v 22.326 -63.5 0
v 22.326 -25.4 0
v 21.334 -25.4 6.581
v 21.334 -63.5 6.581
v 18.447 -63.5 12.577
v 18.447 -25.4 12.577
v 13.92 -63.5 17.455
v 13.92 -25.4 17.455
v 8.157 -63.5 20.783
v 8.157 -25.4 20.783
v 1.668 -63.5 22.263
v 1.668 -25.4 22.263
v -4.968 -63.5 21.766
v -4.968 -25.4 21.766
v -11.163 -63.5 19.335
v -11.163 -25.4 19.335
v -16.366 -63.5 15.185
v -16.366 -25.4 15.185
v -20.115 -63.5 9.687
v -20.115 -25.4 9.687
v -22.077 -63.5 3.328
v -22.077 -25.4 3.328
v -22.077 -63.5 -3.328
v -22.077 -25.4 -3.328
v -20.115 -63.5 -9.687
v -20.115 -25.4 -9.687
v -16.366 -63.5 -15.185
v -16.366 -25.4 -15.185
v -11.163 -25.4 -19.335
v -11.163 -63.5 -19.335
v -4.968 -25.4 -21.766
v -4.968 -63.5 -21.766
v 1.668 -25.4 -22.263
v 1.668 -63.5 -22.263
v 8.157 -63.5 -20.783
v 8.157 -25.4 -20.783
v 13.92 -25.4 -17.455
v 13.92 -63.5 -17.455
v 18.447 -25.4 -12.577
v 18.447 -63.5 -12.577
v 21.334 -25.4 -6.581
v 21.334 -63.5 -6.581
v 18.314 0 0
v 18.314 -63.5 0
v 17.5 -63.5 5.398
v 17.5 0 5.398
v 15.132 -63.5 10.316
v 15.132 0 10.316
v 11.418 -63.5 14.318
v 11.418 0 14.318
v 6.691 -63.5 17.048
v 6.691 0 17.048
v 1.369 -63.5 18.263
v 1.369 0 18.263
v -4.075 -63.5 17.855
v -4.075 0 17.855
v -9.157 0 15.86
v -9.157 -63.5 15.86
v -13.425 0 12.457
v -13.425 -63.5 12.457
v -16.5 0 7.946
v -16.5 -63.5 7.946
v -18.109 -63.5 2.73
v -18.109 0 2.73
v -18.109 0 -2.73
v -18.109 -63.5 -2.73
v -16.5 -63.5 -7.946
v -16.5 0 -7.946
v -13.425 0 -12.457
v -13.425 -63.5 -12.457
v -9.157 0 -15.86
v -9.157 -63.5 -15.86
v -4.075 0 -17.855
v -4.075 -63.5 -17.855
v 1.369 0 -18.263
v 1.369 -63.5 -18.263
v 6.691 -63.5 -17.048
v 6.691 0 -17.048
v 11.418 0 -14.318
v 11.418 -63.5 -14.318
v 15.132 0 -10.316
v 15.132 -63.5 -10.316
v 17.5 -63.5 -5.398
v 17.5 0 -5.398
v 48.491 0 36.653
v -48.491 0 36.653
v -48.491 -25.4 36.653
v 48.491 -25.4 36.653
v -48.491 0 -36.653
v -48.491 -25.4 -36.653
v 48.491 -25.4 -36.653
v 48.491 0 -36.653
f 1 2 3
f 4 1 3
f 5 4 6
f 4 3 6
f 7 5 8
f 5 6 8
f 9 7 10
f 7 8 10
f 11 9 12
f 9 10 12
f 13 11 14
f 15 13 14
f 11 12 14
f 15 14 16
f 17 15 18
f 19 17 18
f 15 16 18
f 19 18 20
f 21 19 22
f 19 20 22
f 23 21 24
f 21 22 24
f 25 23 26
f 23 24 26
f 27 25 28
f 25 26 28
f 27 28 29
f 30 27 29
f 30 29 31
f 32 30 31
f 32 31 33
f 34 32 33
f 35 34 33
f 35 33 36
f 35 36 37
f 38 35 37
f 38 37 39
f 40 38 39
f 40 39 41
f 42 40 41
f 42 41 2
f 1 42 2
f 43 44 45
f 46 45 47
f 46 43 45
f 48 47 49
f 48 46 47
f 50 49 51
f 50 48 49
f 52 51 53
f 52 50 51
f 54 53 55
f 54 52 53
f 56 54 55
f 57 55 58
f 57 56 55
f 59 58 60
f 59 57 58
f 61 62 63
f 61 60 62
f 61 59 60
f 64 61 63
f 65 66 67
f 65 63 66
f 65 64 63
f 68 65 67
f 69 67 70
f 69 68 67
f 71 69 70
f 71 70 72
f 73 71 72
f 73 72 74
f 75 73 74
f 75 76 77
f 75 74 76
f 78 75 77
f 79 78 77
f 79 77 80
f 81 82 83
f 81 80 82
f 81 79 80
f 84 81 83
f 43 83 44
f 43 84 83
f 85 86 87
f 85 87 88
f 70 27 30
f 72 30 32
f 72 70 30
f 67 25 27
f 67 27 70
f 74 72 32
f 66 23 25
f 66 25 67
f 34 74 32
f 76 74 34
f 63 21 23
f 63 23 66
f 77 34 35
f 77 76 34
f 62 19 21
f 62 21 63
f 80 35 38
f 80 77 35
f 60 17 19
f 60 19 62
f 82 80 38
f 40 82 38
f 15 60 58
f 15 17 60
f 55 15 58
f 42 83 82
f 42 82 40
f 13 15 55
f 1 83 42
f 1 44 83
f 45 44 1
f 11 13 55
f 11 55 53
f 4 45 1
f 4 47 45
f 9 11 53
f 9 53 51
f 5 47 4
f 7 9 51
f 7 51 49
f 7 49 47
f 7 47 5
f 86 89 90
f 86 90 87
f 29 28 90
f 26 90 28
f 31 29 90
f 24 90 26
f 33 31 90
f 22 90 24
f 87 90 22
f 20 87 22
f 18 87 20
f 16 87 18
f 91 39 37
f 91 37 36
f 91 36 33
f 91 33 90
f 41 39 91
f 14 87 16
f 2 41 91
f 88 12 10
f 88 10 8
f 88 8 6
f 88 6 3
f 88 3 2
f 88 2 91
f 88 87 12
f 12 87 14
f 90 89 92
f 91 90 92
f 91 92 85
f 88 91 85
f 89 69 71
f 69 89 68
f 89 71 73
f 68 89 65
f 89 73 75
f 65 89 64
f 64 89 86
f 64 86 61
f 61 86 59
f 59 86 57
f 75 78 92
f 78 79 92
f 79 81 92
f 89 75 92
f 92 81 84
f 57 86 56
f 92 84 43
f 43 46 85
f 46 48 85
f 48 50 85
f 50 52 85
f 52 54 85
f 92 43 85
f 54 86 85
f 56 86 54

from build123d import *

# Parameters (mm, degrees)
F0_W     = 96.981816
F0_H     = 73.306844
F3_DEPTH = 25.4
F1_R     = 22.325888
F4_DEPTH = 63.5
F2_R     = 18.313732
F5_DEPTH = 63.501


with BuildPart() as f3:
    # F0 (on Front) → F3 (new body)
    with BuildSketch(Plane.XZ):
        Rectangle(F0_W, F0_H)
    extrude(amount=F3_DEPTH)

    # F1 (on face) → F4 (join)
    with BuildSketch(Plane.XZ):
        Circle(F1_R)
    extrude(amount=F4_DEPTH)

    # F2 (on face) → F5 (cut, through all)
    with BuildSketch(Plane.XZ):
        Circle(F2_R)
    extrude(amount=F5_DEPTH, mode=Mode.SUBTRACT)


solid = f3.part
